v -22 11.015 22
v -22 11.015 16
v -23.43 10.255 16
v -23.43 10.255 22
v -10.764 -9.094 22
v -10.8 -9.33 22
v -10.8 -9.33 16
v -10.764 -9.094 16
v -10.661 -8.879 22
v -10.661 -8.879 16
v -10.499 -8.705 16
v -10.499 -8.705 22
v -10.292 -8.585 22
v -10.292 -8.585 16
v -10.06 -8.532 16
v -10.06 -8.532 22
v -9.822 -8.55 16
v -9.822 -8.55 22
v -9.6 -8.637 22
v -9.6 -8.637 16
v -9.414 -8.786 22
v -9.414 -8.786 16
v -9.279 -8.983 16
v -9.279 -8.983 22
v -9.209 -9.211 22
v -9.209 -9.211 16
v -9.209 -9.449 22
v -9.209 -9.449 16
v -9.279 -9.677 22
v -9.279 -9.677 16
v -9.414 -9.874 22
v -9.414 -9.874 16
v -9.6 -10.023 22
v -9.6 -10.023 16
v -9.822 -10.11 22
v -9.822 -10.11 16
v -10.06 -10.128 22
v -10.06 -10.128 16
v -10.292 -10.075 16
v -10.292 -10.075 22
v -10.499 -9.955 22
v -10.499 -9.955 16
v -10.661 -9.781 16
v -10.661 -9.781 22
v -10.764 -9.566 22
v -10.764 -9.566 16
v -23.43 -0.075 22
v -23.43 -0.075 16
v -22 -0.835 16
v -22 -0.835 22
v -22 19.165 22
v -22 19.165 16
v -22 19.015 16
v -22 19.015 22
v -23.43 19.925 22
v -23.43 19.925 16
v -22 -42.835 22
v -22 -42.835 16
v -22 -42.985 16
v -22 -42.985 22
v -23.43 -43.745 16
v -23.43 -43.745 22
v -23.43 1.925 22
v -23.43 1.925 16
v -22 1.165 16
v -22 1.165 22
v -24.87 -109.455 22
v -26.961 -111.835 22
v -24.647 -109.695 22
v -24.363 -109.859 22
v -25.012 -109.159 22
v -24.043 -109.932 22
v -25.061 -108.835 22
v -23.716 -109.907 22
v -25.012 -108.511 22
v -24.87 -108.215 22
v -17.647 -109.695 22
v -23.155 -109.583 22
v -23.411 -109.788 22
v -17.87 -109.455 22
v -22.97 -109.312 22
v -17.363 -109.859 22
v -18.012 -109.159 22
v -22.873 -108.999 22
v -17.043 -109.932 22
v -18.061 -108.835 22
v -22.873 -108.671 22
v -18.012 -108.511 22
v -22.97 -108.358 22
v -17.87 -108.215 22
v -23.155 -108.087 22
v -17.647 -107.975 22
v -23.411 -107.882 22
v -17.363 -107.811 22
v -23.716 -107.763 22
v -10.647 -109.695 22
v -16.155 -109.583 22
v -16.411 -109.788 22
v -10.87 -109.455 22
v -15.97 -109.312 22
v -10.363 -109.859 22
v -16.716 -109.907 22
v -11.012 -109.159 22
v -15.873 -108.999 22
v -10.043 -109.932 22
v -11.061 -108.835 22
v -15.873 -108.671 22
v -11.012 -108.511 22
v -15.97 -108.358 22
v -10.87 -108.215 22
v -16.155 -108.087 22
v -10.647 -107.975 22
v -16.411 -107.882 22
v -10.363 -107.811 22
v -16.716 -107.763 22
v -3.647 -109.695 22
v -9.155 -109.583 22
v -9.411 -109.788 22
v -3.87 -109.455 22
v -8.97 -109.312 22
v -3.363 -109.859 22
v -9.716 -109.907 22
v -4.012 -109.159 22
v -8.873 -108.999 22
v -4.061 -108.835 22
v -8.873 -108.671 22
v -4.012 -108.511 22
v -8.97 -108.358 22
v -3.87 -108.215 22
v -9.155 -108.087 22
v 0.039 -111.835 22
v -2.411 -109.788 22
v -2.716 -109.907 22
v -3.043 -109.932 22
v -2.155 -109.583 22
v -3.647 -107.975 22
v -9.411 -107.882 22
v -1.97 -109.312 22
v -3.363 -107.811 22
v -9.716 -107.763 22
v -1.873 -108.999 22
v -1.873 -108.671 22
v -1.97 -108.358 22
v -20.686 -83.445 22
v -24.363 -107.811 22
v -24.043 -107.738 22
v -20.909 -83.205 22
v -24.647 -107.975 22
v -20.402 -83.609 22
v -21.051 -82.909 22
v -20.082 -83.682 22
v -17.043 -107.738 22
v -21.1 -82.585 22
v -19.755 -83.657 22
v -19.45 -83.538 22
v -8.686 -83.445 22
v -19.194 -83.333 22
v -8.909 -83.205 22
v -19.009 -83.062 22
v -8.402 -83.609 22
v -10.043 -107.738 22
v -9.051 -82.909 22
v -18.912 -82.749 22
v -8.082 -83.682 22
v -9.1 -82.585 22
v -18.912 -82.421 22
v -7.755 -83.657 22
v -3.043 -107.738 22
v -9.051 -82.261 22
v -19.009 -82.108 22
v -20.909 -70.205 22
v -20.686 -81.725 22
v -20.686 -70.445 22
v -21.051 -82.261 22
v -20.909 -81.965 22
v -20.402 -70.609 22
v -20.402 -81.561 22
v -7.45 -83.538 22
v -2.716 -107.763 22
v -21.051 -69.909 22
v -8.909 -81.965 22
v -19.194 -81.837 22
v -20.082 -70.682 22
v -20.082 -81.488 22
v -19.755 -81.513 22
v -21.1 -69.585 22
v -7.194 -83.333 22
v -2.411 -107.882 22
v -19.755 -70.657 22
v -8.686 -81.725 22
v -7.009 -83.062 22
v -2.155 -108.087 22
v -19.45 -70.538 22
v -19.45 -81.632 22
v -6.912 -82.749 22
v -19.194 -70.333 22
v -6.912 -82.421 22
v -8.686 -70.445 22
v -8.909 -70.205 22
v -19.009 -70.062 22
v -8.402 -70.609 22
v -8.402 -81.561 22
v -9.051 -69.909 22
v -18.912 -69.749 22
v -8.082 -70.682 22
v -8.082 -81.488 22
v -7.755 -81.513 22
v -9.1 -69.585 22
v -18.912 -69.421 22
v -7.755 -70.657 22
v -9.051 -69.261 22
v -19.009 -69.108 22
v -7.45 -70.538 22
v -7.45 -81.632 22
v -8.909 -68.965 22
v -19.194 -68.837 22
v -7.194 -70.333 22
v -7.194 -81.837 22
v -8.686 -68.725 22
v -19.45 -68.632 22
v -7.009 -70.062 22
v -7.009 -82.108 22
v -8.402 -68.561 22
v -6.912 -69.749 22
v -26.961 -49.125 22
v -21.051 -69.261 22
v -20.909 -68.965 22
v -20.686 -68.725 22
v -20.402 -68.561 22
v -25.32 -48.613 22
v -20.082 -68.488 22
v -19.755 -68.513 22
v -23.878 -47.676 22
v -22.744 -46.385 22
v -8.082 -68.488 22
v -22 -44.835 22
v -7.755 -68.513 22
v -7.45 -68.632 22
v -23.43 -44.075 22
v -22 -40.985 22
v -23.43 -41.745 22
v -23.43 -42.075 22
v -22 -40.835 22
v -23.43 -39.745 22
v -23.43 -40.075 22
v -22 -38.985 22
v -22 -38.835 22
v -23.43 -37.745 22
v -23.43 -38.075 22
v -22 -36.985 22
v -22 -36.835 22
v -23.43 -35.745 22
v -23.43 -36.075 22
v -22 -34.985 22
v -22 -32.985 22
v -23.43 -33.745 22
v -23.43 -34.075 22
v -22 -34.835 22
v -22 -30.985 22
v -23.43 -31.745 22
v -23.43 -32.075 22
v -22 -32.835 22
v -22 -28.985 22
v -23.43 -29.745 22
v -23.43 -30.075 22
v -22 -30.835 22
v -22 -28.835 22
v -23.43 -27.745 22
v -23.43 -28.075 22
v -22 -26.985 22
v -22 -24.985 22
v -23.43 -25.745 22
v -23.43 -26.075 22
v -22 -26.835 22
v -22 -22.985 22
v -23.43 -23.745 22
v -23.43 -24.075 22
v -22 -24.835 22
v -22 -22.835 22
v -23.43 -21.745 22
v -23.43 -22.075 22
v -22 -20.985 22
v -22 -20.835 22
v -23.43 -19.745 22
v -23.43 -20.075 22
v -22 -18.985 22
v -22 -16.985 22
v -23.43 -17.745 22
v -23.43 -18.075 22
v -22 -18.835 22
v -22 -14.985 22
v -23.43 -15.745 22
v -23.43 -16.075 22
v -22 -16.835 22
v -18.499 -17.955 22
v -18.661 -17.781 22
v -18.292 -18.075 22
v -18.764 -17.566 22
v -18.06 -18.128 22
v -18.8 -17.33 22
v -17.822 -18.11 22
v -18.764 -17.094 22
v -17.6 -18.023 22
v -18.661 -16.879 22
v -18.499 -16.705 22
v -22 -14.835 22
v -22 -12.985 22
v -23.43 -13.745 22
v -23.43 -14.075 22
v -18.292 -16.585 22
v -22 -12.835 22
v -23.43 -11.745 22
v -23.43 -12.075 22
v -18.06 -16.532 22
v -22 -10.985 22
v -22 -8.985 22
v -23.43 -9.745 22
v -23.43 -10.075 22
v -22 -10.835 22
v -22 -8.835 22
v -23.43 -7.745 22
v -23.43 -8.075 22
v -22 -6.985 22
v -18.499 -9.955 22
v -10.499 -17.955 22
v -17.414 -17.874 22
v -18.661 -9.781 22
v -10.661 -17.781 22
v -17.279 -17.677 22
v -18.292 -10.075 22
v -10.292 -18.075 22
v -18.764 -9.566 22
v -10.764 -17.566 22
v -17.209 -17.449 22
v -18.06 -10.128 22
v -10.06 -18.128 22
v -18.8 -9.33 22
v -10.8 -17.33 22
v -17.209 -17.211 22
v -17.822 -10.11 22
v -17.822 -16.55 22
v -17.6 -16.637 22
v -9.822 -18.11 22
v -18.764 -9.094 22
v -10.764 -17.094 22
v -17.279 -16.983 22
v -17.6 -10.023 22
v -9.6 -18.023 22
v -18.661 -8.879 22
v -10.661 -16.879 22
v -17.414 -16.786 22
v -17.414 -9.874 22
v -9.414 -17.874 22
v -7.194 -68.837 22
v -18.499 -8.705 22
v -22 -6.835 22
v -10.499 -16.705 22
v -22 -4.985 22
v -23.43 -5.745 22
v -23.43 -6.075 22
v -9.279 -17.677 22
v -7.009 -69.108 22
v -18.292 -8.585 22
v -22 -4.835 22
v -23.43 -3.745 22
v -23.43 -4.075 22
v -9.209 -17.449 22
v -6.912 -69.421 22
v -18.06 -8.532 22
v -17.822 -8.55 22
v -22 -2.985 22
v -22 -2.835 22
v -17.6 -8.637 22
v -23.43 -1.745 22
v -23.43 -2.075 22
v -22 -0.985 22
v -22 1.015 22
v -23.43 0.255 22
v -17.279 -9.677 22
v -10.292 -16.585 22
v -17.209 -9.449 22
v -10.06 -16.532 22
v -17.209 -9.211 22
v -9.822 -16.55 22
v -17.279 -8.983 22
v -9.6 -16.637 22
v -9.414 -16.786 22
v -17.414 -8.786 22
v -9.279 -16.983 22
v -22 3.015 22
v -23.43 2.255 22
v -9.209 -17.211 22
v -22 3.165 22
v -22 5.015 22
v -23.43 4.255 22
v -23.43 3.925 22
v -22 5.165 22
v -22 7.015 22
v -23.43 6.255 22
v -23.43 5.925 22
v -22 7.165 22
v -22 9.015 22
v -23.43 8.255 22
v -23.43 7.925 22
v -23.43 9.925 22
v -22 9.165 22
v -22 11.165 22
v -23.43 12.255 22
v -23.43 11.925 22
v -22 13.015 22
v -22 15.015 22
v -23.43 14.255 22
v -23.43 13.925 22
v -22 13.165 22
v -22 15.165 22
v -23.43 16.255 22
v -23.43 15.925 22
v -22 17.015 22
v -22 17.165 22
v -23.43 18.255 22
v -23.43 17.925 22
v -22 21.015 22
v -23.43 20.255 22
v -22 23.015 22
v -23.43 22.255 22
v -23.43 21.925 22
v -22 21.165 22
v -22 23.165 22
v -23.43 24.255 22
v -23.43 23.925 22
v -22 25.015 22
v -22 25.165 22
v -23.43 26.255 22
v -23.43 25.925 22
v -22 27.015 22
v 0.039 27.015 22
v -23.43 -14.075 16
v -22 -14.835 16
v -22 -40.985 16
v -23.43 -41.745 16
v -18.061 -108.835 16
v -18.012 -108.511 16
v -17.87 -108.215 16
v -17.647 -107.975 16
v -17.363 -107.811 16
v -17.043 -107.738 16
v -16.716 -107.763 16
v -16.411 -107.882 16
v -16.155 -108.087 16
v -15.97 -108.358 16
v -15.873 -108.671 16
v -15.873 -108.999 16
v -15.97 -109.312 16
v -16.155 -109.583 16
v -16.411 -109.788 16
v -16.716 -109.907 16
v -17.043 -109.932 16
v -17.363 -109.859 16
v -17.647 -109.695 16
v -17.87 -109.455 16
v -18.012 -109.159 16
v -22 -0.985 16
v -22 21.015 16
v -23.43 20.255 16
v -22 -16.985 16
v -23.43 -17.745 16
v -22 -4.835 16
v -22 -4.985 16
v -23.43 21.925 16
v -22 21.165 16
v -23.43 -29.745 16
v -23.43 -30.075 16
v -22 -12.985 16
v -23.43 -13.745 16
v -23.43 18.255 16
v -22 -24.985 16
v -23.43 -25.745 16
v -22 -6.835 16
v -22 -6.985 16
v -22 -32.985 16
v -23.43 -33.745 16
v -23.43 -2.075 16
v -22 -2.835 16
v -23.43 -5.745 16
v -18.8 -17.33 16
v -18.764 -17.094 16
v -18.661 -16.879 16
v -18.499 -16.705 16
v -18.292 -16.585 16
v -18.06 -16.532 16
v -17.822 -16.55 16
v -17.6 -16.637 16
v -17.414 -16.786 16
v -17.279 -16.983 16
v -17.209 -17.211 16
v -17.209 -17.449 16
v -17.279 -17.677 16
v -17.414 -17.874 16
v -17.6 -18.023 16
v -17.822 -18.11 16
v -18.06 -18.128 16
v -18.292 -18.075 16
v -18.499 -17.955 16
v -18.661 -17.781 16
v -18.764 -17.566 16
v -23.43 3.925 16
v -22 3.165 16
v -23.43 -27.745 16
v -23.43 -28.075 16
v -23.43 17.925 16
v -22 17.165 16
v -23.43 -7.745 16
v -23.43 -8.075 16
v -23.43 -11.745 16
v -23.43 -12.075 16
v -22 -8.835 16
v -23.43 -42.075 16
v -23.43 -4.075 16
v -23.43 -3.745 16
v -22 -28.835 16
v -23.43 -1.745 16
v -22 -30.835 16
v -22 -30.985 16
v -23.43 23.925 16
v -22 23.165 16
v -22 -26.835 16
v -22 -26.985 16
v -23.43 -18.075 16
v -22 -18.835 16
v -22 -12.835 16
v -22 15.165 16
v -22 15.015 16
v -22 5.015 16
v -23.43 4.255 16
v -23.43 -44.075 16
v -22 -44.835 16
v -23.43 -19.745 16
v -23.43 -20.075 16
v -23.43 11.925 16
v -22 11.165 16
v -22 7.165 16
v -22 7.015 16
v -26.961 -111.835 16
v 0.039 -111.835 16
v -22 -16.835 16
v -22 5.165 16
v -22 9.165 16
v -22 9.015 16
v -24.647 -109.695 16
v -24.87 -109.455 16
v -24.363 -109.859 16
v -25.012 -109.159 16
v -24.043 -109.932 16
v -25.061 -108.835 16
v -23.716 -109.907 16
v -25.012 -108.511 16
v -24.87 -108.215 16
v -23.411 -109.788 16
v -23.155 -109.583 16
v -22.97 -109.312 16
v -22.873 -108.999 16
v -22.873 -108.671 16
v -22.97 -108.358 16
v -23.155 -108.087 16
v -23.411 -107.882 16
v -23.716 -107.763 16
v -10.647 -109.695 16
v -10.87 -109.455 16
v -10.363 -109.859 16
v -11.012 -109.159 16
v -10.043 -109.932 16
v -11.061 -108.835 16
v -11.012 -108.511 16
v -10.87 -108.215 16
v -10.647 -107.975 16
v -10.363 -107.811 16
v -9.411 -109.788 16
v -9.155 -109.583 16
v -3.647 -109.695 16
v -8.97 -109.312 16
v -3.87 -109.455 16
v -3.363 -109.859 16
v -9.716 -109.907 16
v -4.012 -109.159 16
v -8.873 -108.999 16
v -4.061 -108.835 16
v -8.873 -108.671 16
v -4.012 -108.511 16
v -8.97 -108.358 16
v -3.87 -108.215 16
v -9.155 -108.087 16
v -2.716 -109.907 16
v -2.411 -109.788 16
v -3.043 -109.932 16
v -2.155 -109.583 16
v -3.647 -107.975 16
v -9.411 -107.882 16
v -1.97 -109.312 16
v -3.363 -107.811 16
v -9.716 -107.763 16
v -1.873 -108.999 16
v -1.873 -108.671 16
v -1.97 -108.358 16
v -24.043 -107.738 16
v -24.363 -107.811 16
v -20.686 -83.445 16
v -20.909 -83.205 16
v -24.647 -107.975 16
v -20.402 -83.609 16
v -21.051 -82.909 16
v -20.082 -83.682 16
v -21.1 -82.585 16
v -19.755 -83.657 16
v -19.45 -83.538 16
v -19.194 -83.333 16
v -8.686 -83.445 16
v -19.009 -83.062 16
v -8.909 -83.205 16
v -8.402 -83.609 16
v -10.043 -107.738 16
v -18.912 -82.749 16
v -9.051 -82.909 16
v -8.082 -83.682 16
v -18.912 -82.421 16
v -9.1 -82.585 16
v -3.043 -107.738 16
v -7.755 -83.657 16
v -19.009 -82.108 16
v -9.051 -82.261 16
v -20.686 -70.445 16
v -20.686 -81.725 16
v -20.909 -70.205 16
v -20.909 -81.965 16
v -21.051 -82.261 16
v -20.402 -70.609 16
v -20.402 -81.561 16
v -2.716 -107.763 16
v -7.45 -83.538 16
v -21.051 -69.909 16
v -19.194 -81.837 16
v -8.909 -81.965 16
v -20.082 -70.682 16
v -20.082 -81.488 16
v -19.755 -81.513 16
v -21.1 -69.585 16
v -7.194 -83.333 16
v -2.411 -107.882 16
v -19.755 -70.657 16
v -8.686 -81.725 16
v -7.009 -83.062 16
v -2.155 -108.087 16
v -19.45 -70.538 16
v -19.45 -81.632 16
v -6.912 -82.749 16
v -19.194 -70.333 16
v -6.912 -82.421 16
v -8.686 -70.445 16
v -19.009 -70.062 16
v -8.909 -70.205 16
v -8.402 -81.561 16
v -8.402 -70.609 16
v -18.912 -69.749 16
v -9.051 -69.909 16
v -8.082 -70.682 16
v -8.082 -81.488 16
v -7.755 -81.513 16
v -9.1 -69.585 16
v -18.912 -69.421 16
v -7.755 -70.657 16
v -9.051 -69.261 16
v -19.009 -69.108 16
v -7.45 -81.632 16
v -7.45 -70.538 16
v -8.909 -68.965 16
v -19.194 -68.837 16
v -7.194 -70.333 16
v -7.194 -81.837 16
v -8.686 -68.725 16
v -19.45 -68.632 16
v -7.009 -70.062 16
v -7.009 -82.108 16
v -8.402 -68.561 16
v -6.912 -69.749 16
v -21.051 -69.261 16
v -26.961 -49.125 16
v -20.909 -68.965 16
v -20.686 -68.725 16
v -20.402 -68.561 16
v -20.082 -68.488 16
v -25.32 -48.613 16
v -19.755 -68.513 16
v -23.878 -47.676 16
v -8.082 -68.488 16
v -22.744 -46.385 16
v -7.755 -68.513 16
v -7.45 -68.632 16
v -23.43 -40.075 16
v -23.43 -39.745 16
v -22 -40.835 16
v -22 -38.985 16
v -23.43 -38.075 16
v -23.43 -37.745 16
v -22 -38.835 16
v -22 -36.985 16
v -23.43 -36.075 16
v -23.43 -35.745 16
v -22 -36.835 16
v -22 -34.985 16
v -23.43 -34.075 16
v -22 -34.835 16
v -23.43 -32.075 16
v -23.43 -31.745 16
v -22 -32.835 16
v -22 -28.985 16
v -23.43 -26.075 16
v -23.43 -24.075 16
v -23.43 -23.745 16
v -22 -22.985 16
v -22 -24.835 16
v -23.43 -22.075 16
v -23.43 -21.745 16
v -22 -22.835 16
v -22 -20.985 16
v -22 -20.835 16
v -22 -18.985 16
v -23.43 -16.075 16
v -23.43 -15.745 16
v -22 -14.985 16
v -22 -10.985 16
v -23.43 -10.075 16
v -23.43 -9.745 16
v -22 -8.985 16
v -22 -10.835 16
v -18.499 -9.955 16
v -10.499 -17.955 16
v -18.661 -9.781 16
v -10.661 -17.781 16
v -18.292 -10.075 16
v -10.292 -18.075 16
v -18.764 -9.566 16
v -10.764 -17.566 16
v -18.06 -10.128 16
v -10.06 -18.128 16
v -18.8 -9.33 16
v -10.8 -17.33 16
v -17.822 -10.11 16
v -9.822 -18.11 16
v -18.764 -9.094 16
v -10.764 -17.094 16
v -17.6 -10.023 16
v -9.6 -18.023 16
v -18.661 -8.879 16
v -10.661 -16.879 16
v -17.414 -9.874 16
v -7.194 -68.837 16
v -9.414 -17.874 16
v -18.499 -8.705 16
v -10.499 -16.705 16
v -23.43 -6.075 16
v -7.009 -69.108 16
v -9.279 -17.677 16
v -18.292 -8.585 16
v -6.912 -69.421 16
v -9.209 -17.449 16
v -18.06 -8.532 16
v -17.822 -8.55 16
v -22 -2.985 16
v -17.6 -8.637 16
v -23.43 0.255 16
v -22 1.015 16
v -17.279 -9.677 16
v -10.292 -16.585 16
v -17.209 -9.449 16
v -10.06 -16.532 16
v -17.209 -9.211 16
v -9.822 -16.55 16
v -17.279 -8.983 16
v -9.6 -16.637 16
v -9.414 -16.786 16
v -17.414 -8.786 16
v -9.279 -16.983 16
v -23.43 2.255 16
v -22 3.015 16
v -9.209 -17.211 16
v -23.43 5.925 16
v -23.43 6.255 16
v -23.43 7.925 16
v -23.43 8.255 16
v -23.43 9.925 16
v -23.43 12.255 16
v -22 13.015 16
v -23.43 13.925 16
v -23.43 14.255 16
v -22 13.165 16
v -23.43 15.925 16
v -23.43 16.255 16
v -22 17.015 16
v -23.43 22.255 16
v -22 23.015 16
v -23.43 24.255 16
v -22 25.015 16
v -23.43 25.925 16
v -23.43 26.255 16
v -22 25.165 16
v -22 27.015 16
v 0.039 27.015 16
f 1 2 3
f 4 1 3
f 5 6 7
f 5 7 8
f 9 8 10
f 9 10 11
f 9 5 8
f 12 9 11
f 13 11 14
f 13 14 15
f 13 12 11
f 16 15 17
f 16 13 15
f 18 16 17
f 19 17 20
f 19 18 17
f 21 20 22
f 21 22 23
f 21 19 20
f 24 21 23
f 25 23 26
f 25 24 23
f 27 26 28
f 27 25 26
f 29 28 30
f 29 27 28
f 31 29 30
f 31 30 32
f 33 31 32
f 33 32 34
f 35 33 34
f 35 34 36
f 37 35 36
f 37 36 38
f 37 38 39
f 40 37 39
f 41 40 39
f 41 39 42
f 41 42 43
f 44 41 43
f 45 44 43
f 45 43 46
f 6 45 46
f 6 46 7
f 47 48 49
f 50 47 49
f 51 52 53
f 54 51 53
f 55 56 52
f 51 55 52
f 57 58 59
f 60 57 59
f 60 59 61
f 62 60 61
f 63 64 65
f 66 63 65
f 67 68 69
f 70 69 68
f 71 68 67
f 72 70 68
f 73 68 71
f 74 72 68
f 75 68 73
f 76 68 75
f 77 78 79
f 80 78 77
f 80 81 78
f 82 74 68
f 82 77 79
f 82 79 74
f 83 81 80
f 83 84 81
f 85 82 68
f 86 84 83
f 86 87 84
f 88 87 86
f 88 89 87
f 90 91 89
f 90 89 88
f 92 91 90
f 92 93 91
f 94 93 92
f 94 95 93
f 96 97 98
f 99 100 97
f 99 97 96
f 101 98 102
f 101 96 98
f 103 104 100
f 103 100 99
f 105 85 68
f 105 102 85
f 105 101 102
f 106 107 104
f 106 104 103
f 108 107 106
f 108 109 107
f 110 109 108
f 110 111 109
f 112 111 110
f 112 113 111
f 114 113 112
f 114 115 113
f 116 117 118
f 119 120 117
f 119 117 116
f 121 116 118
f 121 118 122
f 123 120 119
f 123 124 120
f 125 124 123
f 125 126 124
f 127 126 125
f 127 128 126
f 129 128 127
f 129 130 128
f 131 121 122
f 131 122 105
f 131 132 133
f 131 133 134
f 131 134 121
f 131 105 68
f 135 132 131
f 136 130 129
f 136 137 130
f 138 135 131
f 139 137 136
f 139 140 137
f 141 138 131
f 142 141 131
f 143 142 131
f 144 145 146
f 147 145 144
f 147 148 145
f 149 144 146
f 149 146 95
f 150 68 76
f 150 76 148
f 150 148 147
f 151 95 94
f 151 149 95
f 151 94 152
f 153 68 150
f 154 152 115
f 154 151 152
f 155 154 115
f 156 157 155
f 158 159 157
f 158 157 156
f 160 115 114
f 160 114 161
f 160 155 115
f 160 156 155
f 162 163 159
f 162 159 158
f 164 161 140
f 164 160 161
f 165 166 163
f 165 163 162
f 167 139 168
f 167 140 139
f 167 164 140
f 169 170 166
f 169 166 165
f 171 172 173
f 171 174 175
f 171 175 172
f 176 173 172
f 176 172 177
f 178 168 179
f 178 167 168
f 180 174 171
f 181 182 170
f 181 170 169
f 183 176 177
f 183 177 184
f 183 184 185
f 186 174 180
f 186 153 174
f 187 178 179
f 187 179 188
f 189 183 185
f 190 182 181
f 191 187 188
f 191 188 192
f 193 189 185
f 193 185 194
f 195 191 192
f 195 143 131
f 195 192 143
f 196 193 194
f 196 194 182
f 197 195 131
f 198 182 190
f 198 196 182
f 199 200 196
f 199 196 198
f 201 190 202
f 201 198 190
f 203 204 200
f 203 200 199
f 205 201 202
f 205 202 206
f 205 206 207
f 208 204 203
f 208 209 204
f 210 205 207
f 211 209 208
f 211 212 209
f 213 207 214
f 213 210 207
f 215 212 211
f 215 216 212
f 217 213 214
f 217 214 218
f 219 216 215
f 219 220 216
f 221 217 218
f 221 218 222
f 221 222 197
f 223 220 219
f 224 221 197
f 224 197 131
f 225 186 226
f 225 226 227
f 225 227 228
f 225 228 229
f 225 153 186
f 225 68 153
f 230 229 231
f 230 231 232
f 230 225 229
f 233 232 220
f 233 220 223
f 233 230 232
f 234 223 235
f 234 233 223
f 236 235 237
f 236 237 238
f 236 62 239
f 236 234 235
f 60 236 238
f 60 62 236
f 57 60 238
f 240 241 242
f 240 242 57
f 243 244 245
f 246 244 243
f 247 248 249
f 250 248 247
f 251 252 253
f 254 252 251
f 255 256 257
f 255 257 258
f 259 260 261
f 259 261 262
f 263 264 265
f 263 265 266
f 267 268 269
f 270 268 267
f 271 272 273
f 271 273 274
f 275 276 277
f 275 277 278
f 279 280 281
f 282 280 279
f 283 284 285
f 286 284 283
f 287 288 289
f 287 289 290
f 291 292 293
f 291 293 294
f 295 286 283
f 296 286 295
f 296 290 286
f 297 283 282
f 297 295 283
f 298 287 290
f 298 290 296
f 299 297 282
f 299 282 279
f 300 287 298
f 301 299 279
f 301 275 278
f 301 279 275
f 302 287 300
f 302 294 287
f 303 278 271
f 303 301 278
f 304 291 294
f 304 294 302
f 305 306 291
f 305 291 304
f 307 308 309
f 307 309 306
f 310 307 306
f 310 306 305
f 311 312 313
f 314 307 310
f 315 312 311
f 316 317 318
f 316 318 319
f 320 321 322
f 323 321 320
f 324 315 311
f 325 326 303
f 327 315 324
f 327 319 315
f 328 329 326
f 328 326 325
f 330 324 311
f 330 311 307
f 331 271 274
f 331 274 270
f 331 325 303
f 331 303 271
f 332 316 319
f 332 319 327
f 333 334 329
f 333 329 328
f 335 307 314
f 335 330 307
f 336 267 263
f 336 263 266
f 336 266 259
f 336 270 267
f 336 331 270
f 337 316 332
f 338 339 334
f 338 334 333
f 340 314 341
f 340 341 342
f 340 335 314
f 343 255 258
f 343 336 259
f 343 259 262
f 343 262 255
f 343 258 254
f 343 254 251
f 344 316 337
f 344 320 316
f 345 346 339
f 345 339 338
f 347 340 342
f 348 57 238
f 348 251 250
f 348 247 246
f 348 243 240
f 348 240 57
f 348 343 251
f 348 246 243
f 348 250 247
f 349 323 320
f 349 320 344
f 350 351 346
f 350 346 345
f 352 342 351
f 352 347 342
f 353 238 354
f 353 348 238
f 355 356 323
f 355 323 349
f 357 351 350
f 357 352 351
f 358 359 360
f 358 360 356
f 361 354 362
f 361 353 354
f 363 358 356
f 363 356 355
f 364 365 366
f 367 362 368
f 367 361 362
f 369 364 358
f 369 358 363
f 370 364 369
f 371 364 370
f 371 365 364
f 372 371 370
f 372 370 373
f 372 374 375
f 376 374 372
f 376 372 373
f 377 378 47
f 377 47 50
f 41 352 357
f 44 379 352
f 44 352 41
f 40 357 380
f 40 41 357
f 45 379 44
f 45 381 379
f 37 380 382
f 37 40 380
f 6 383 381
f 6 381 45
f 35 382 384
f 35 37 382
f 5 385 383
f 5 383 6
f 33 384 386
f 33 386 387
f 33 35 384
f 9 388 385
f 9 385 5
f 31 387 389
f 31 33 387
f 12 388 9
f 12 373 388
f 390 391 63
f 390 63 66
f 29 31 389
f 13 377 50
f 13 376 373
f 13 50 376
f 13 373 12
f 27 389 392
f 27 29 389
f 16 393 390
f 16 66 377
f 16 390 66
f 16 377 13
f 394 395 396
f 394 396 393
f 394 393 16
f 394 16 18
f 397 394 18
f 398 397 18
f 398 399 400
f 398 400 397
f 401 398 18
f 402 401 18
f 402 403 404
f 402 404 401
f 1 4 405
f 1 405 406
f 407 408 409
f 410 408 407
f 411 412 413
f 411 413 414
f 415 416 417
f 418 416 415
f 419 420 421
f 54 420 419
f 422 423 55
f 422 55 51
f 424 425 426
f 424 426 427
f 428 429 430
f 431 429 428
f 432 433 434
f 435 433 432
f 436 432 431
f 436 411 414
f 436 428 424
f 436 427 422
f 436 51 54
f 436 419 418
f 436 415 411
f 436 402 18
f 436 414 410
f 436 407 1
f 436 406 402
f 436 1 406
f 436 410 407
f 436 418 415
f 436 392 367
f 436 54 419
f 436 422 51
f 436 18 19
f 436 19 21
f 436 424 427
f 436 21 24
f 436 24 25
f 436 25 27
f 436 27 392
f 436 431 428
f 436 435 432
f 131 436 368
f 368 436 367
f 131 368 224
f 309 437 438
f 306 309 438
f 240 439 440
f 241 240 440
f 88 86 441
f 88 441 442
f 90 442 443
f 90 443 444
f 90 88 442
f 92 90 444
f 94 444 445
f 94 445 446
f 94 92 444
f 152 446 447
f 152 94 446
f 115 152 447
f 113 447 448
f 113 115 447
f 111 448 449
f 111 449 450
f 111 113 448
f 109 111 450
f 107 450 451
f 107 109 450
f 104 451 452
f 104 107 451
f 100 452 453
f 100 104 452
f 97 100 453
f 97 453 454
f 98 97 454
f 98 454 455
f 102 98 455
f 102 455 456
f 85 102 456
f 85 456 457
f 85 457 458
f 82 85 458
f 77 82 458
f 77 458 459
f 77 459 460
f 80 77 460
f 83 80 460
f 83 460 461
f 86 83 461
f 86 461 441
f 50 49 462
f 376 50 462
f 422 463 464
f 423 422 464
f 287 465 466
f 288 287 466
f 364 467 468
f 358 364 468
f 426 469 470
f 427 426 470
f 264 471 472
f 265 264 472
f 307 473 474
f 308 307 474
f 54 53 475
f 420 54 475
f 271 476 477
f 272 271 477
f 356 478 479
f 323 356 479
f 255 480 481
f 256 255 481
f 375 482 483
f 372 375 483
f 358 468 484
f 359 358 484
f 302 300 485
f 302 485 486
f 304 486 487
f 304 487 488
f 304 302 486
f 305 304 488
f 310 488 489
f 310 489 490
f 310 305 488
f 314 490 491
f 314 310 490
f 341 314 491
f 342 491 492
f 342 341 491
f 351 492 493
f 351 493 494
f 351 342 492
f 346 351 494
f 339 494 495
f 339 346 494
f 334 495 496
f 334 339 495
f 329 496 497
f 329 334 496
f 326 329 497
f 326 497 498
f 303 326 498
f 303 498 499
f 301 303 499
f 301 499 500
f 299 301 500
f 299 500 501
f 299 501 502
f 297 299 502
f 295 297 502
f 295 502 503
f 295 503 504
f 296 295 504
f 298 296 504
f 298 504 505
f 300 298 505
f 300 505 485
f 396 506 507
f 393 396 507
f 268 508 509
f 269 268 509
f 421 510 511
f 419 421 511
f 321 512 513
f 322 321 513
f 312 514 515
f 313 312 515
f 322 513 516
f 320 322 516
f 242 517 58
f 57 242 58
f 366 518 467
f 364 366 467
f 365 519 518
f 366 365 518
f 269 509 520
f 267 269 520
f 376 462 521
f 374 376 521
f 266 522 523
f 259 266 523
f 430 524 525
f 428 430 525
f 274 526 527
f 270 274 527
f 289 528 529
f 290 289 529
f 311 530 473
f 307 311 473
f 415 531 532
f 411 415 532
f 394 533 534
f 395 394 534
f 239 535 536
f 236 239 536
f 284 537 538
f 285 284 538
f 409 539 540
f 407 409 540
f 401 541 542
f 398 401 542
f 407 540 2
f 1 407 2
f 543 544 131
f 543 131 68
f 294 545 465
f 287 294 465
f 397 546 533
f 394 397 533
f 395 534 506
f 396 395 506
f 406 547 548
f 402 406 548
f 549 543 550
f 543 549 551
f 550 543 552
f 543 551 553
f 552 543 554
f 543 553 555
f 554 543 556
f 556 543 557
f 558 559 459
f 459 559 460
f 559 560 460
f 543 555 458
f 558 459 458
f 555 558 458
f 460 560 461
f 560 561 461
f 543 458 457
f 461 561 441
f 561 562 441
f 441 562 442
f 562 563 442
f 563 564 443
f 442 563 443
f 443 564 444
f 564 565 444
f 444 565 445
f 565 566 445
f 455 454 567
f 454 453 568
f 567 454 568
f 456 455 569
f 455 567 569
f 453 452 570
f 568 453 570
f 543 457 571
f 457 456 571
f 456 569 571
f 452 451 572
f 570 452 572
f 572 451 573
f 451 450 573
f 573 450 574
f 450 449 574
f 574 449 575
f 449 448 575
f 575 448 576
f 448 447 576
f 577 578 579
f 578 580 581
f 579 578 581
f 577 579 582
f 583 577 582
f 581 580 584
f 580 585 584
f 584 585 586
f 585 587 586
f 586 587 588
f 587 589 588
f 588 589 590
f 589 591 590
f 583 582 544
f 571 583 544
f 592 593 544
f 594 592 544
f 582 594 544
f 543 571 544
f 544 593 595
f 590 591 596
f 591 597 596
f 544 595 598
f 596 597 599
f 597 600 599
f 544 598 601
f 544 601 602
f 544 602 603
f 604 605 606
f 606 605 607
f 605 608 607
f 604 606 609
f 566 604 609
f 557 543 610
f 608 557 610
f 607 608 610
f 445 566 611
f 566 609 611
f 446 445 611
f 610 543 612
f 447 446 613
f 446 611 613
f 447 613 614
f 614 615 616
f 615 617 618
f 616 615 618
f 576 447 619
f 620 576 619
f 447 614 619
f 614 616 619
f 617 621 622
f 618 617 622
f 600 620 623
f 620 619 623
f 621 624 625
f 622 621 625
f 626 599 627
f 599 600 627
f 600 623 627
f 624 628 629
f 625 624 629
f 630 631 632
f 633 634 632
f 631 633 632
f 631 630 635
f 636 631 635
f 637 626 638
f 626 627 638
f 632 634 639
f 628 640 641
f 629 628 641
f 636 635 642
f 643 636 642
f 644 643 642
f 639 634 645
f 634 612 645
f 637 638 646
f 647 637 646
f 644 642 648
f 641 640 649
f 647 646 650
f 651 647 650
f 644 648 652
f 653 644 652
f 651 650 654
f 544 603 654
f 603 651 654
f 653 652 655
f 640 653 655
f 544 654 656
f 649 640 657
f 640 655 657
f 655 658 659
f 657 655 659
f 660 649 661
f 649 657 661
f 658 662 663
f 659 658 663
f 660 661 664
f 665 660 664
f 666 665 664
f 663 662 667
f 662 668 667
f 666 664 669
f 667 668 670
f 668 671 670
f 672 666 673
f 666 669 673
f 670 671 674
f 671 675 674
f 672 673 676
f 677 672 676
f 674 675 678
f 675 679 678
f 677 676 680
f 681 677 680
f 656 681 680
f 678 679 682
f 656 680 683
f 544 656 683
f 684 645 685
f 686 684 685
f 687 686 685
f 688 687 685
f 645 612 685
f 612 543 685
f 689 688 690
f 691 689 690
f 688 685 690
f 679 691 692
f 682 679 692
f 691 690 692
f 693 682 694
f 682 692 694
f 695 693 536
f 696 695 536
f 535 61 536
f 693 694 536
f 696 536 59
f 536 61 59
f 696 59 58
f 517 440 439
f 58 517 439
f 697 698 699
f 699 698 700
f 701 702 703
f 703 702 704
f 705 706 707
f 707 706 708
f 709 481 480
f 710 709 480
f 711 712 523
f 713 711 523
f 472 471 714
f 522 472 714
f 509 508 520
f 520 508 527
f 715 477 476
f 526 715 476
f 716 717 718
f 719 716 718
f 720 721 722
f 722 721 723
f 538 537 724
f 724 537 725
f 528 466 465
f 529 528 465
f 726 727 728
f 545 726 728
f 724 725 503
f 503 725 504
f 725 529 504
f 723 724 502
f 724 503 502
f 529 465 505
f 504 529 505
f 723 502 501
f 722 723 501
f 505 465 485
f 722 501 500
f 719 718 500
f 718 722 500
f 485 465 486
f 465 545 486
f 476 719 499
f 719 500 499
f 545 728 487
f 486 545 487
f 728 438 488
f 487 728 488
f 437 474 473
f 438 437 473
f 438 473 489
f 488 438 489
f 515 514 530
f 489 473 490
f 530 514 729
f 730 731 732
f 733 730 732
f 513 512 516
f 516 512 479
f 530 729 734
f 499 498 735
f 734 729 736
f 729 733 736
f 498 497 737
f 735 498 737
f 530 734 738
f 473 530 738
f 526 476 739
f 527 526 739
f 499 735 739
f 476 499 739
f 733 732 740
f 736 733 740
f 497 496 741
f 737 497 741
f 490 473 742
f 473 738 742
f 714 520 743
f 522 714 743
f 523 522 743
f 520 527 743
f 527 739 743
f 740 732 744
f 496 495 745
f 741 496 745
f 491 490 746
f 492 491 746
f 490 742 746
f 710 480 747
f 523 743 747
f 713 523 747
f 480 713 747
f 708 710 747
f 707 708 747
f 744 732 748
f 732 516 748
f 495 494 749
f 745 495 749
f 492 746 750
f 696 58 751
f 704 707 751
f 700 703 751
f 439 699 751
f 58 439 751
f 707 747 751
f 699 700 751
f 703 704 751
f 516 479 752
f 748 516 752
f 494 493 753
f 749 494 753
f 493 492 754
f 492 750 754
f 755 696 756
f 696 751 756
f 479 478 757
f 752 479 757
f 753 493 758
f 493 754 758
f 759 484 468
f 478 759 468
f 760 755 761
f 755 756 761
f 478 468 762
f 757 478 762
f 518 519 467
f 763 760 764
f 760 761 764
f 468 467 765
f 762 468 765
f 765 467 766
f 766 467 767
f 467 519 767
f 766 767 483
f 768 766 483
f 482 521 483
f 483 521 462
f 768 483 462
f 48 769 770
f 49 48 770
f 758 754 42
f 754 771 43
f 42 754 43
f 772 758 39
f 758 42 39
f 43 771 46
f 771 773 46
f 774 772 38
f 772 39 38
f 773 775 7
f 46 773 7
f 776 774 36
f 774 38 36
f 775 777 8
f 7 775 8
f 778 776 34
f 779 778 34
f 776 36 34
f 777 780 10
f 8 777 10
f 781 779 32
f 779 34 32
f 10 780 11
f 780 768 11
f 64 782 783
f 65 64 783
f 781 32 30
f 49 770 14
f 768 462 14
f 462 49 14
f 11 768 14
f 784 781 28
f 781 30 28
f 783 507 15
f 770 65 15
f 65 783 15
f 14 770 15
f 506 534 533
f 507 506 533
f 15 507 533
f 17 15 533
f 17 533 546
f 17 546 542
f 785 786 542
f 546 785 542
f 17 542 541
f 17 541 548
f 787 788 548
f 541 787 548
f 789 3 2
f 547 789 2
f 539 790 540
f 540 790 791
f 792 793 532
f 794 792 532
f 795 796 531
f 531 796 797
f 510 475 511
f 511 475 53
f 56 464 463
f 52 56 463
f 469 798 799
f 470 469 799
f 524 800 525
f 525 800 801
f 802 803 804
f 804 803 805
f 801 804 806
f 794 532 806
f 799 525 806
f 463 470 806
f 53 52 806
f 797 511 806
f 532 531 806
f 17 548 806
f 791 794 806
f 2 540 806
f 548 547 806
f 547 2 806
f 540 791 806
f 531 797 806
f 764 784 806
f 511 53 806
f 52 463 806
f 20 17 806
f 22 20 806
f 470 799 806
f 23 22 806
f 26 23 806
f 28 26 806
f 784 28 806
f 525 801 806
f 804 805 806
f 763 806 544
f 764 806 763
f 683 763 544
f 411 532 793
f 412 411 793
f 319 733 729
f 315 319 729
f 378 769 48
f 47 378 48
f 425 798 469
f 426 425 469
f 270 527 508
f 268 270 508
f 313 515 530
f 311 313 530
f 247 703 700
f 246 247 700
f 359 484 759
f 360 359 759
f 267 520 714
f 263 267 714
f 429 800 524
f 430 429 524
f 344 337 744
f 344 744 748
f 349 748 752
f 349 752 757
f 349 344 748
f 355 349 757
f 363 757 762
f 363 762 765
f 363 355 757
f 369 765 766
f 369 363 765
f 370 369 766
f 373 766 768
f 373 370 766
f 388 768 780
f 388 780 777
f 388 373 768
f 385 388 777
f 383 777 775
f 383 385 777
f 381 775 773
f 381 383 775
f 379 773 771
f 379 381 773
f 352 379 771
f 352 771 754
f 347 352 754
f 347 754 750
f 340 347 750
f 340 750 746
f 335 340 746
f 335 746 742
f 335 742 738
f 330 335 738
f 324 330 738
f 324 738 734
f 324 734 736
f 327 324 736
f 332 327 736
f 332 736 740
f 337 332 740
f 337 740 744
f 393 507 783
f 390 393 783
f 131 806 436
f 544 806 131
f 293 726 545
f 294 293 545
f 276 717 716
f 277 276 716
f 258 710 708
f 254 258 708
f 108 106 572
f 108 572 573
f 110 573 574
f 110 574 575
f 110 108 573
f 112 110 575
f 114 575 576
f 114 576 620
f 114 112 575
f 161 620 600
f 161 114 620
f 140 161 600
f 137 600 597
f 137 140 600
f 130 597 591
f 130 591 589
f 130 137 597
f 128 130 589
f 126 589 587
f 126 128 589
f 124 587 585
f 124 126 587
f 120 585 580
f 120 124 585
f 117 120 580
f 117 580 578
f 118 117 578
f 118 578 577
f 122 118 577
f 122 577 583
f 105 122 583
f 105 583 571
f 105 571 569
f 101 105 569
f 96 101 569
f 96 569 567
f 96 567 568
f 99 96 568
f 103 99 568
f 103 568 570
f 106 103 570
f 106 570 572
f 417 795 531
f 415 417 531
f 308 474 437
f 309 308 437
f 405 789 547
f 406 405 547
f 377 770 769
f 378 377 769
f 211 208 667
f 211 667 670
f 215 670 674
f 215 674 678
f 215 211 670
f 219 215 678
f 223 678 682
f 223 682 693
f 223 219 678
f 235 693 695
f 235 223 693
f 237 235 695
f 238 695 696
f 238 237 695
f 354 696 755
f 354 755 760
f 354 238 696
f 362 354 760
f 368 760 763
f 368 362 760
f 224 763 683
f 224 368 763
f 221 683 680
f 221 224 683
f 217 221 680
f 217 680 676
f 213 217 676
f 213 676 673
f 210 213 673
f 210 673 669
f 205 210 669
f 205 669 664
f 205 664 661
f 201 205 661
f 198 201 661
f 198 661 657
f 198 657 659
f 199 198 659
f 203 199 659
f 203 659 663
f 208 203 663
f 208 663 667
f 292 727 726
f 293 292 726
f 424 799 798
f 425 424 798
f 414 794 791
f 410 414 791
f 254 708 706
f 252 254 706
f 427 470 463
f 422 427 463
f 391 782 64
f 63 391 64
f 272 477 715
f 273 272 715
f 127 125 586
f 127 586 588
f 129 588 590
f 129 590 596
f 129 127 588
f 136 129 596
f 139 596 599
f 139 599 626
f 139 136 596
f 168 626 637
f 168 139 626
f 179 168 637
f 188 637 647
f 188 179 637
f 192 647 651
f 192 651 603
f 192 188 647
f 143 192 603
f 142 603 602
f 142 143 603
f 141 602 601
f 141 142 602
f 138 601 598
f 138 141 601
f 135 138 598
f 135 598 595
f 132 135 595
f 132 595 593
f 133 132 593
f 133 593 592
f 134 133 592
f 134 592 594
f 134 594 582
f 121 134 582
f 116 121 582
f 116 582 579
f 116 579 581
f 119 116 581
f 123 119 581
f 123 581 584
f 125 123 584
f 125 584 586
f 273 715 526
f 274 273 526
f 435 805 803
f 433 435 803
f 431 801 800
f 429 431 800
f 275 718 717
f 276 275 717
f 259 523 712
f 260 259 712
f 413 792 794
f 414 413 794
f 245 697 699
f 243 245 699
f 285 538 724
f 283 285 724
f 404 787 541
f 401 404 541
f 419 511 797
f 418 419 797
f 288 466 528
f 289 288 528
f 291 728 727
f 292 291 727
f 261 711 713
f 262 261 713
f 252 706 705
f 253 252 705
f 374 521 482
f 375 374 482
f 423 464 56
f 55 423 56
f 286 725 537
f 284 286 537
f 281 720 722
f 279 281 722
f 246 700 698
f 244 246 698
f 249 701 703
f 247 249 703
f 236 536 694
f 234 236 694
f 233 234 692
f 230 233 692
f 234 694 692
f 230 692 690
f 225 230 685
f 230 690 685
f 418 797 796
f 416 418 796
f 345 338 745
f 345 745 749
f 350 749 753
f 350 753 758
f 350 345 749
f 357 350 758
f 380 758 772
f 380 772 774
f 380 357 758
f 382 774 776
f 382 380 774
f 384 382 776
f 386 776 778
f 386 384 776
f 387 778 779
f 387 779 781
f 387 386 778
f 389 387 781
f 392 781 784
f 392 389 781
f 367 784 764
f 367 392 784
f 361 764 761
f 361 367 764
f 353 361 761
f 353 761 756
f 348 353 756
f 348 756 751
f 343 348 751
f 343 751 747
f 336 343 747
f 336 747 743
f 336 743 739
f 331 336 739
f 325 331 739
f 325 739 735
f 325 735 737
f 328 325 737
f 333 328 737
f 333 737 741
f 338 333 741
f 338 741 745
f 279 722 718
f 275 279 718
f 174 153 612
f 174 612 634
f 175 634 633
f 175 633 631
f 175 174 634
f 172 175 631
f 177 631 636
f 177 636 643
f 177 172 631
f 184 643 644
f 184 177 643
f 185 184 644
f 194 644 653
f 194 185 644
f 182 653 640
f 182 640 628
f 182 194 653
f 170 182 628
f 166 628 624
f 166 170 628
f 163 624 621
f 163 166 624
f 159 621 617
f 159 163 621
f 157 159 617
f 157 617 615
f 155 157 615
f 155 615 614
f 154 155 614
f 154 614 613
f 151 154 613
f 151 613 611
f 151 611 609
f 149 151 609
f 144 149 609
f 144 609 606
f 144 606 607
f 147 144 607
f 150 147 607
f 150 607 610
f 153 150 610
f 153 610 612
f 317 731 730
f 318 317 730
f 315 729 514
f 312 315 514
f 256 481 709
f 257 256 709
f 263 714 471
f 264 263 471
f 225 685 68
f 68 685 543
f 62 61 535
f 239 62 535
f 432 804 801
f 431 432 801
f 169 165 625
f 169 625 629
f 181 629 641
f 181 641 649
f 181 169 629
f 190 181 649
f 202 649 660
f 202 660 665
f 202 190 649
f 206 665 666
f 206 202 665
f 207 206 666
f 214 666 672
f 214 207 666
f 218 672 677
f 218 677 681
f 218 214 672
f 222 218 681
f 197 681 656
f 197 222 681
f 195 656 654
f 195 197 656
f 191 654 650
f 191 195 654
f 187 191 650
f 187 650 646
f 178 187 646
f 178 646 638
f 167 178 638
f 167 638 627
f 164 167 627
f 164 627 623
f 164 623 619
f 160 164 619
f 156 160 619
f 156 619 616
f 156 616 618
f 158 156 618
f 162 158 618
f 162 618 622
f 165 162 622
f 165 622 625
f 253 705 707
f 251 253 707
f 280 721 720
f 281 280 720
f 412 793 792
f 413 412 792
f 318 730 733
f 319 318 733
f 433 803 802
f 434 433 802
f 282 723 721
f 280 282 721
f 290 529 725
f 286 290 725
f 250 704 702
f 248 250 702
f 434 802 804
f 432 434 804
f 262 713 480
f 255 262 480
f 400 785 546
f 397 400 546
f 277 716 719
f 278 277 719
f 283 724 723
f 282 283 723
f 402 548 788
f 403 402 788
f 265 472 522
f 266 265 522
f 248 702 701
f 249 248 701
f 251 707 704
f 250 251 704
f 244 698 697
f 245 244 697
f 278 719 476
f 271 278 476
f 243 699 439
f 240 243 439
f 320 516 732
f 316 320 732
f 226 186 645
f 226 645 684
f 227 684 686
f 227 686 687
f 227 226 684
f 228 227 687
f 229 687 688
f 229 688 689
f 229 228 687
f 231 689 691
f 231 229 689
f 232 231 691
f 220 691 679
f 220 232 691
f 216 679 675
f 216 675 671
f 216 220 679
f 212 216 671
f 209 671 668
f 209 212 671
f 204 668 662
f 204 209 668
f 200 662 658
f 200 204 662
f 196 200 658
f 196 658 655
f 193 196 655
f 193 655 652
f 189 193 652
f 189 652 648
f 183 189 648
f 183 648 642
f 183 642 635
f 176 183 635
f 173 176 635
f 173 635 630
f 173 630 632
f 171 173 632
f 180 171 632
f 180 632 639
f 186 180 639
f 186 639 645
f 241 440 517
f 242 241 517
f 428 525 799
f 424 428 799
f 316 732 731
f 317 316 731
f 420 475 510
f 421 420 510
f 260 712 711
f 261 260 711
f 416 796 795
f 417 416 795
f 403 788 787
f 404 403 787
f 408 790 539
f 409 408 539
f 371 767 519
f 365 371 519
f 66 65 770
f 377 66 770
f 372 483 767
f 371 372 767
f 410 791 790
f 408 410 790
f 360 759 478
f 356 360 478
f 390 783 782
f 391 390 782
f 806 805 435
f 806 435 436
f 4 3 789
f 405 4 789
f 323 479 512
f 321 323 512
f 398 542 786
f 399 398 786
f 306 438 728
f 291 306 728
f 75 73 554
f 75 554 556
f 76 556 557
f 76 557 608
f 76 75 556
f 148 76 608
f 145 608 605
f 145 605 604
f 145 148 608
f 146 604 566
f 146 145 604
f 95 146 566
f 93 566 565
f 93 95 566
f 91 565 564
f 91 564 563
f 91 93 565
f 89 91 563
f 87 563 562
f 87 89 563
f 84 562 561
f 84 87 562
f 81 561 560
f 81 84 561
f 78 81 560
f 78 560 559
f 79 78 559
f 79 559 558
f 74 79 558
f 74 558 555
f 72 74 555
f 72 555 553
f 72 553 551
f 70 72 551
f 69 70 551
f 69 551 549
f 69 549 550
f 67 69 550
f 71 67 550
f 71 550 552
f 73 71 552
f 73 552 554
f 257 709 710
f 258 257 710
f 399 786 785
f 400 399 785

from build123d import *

# Parameters (mm, degrees)
PAD010_DEPTH  = 6
SKETCH038_R   = 1.1
HOLE011_DEPTH = 25
SKETCH039_R   = 1.1
HOLE012_DEPTH = 25
SKETCH052_R   = 0.8
HOLE019_DEPTH = 25


with BuildPart() as lift:
    # Sketch037 → Pad010 (new body)
    with BuildSketch(Plane.XY):
        with BuildLine():
            Line((-32.57, 26.255), (-32.57, 25.925))
            Line((-32.57, 25.925), (-34, 25.165))
            Line((-34, 25.165), (-34, 25.015))
            Line((-34, 25.015), (-32.57, 24.255))
            Line((-32.57, 24.255), (-32.57, 23.925))
            Line((-32.57, 23.925), (-34, 23.165))
            Line((-34, 23.165), (-34, 23.015))
            Line((-34, 23.015), (-32.57, 22.255))
            Line((-32.57, 22.255), (-32.57, 21.925))
            Line((-32.57, 21.925), (-34, 21.165))
            Line((-34, 21.165), (-34, 21.015))
            Line((-34, 21.015), (-32.57, 20.255))
            Line((-32.57, 20.255), (-32.57, 19.925))
            Line((-32.57, 19.925), (-34, 19.165))
            Line((-34, 19.165), (-34, 19.015))
            Line((-34, 19.015), (-32.57, 18.255))
            Line((-32.57, 18.255), (-32.57, 17.925))
            Line((-32.57, 17.925), (-34, 17.165))
            Line((-34, 17.165), (-34, 17.015))
            Line((-34, 17.015), (-32.57, 16.255))
            Line((-32.57, 16.255), (-32.57, 15.925))
            Line((-32.57, 15.925), (-34, 15.165))
            Line((-34, 15.165), (-34, 15.015))
            Line((-34, 15.015), (-32.57, 14.255))
            Line((-32.57, 14.255), (-32.57, 13.925))
            Line((-32.57, 13.925), (-34, 13.165))
            Line((-34, 13.165), (-34, 13.015))
            Line((-34, 13.015), (-32.57, 12.255))
            Line((-32.57, 12.255), (-32.57, 11.925))
            Line((-32.57, 11.925), (-34, 11.165))
            Line((-34, 11.165), (-34, 11.015))
            Line((-34, 11.015), (-32.57, 10.255))
            Line((-32.57, 10.255), (-32.57, 9.925))
            Line((-32.57, 9.925), (-34, 9.165))
            Line((-34, 9.165), (-34, 9.015))
            Line((-34, 9.015), (-32.57, 8.255))
            Line((-32.57, 8.255), (-32.57, 7.925))
            Line((-32.57, 7.925), (-34, 7.165))
            Line((-34, 7.165), (-34, 7.015))
            Line((-34, 7.015), (-32.57, 6.255))
            Line((-32.57, 6.255), (-32.57, 5.925))
            Line((-32.57, 5.925), (-34, 5.165))
            Line((-34, 5.165), (-34, 5.015))
            Line((-34, 5.015), (-32.57, 4.255))
            Line((-32.57, 4.255), (-32.57, 3.925))
            Line((-32.57, 3.925), (-34, 3.165))
            Line((-34, 3.165), (-34, 3.015))
            Line((-34, 3.015), (-32.57, 2.255))
            Line((-32.57, 2.255), (-32.57, 1.925))
            Line((-32.57, 1.925), (-34, 1.165))
            Line((-34, 1.165), (-34, 1.015))
            Line((-34, 1.015), (-32.57, 0.255))
            Line((-32.57, 0.255), (-32.57, -0.075))
            Line((-32.57, -0.075), (-34, -0.835))
            Line((-34, -0.835), (-34, -0.985))
            Line((-34, -0.985), (-32.57, -1.745))
            Line((-32.57, -1.745), (-32.57, -2.075))
            Line((-32.57, -2.075), (-34, -2.835))
            Line((-34, -2.835), (-34, -2.985))
            Line((-34, -2.985), (-32.57, -3.745))
            Line((-32.57, -3.745), (-32.57, -4.075))
            Line((-32.57, -4.075), (-34, -4.835))
            Line((-34, -4.835), (-34, -4.985))
            Line((-34, -4.985), (-32.57, -5.745))
            Line((-32.57, -5.745), (-32.57, -6.075))
            Line((-32.57, -6.075), (-34, -6.835))
            Line((-34, -6.835), (-34, -6.985))
            Line((-34, -6.985), (-32.57, -7.745))
            Line((-32.57, -7.745), (-32.57, -8.075))
            Line((-32.57, -8.075), (-34, -8.835))
            Line((-34, -8.835), (-34, -8.985))
            Line((-34, -8.985), (-32.57, -9.745))
            Line((-32.57, -9.745), (-32.57, -10.075))
            Line((-32.57, -10.075), (-34, -10.835))
            Line((-34, -10.835), (-34, -10.985))
            Line((-34, -10.985), (-32.57, -11.745))
            Line((-32.57, -11.745), (-32.57, -12.075))
            Line((-32.57, -12.075), (-34, -12.835))
            Line((-34, -12.835), (-34, -12.985))
            Line((-34, -12.985), (-32.57, -13.745))
            Line((-32.57, -13.745), (-32.57, -14.075))
            Line((-32.57, -14.075), (-34, -14.835))
            Line((-34, -14.835), (-34, -14.985))
            Line((-34, -14.985), (-32.57, -15.745))
            Line((-32.57, -15.745), (-32.57, -16.075))
            Line((-32.57, -16.075), (-34, -16.835))
            Line((-34, -16.835), (-34, -16.985))
            Line((-34, -16.985), (-32.57, -17.745))
            Line((-32.57, -17.745), (-32.57, -18.075))
            Line((-32.57, -18.075), (-34, -18.835))
            Line((-34, -18.835), (-34, -18.985))
            Line((-34, -18.985), (-32.57, -19.745))
            Line((-32.57, -19.745), (-32.57, -20.075))
            Line((-32.57, -20.075), (-34, -20.835))
            Line((-34, -20.835), (-34, -20.985))
            Line((-34, -20.985), (-32.57, -21.745))
            Line((-32.57, -21.745), (-32.57, -22.075))
            Line((-32.57, -22.075), (-34, -22.835))
            Line((-34, -22.835), (-34, -22.985))
            Line((-34, -22.985), (-32.57, -23.745))
            Line((-32.57, -23.745), (-32.57, -24.075))
            Line((-32.57, -24.075), (-34, -24.835))
            Line((-34, -24.835), (-34, -24.985))
            Line((-34, -24.985), (-32.57, -25.745))
            Line((-32.57, -25.745), (-32.57, -26.075))
            Line((-32.57, -26.075), (-34, -26.835))
            Line((-34, -26.835), (-34, -26.985))
            Line((-34, -26.985), (-32.57, -27.745))
            Line((-32.57, -27.745), (-32.57, -28.075))
            Line((-32.57, -28.075), (-34, -28.835))
            Line((-34, -28.835), (-34, -28.985))
            Line((-34, -28.985), (-32.57, -29.745))
            Line((-32.57, -29.745), (-32.57, -30.075))
            Line((-32.57, -30.075), (-34, -30.835))
            Line((-34, -30.835), (-34, -30.985))
            Line((-34, -30.985), (-32.57, -31.745))
            Line((-32.57, -31.745), (-32.57, -32.075))
            Line((-32.57, -32.075), (-34, -32.835))
            Line((-34, -32.835), (-34, -32.985))
            Line((-34, -32.985), (-32.57, -33.745))
            Line((-32.57, -33.745), (-32.57, -34.075))
            Line((-32.57, -34.075), (-34, -34.835))
            Line((-34, -34.835), (-34, -34.985))
            Line((-34, -34.985), (-32.57, -35.745))
            Line((-32.57, -35.745), (-32.57, -36.075))
            Line((-32.57, -36.075), (-34, -36.835))
            Line((-34, -36.835), (-34, -36.985))
            Line((-34, -36.985), (-32.57, -37.745))
            Line((-32.57, -37.745), (-32.57, -38.075))
            Line((-32.57, -38.075), (-34, -38.835))
            Line((-34, -38.835), (-34, -38.985))
            Line((-34, -38.985), (-32.57, -39.745))
            Line((-32.57, -39.745), (-32.57, -40.075))
            Line((-32.57, -40.075), (-34, -40.835))
            Line((-34, -40.835), (-34, -40.985))
            Line((-34, -40.985), (-32.57, -41.745))
            Line((-32.57, -41.745), (-32.57, -42.075))
            Line((-32.57, -42.075), (-34, -42.835))
            Line((-34, -42.835), (-34, -42.985))
            Line((-34, -42.985), (-32.57, -43.745))
            Line((-32.57, -43.745), (-32.57, -44.075))
            Line((-32.57, -44.075), (-34, -44.835))
            ThreePointArc((-34, -44.835), (-32.121614, -47.676332), (-29.038942, -49.125))
            Line((-29.038942, -49.125), (-29.038942, -111.835))
            Line((-56.038942, -111.835), (-29.038942, -111.835))
            Line((-56.038942, 27.015), (-56.038942, -111.835))
            Line((-34, 27.015), (-56.038942, 27.015))
            Line((-34, 27.015), (-32.57, 26.255))
        make_face()
    extrude(amount=PAD010_DEPTH)

    # Sketch038 (on Face150 of Pad010) → Hole011 (cut)
    with BuildSketch(Plane.XY.offset(6)):
        with Locations((-48, -69.585)):
            Circle(SKETCH038_R)
        with Locations((-36, -69.585)):
            Circle(SKETCH038_R)
        with Locations((-48, -82.585)):
            Circle(SKETCH038_R)
        with Locations((-36, -82.585)):
            Circle(SKETCH038_R)
    extrude(amount=-HOLE011_DEPTH, mode=Mode.SUBTRACT)

    # Sketch039 (on Face5 of Hole011) → Hole012 (cut)
    with BuildSketch(Plane.XY.offset(6)):
        with Locations((-53.038942, -108.835)):
            Circle(SKETCH039_R)
        with Locations((-46.038942, -108.835)):
            Circle(SKETCH039_R)
        with Locations((-39.038942, -108.835)):
            Circle(SKETCH039_R)
        with Locations((-32.038942, -108.835)):
            Circle(SKETCH039_R)
    extrude(amount=-HOLE012_DEPTH, mode=Mode.SUBTRACT)

    # Sketch052 (on Face5 of Hole012) → Hole019 (cut)
    with BuildSketch(Plane.XY.offset(6)):
        with Locations((-46, -9.33)):
            Circle(SKETCH052_R)
        with Locations((-38, -9.33)):
            Circle(SKETCH052_R)
        with Locations((-46, -17.33)):
            Circle(SKETCH052_R)
        with Locations((-38, -17.33)):
            Circle(SKETCH052_R)
    extrude(amount=-HOLE019_DEPTH, mode=Mode.SUBTRACT)


with BuildPart() as part_mirroring:
    # Part__Mirroring: instance of Lift
    add(lift.part.mirror(Plane(origin=(0, 0, 0), x_dir=(0, -1, 0), z_dir=(1, 0, 0))))


with BuildPart() as part_mirroring_1:
    # Part__Mirroring placement: moved
    add(part_mirroring.part.moved(Location((-56, 0, 16))))


solid = part_mirroring_1.part
